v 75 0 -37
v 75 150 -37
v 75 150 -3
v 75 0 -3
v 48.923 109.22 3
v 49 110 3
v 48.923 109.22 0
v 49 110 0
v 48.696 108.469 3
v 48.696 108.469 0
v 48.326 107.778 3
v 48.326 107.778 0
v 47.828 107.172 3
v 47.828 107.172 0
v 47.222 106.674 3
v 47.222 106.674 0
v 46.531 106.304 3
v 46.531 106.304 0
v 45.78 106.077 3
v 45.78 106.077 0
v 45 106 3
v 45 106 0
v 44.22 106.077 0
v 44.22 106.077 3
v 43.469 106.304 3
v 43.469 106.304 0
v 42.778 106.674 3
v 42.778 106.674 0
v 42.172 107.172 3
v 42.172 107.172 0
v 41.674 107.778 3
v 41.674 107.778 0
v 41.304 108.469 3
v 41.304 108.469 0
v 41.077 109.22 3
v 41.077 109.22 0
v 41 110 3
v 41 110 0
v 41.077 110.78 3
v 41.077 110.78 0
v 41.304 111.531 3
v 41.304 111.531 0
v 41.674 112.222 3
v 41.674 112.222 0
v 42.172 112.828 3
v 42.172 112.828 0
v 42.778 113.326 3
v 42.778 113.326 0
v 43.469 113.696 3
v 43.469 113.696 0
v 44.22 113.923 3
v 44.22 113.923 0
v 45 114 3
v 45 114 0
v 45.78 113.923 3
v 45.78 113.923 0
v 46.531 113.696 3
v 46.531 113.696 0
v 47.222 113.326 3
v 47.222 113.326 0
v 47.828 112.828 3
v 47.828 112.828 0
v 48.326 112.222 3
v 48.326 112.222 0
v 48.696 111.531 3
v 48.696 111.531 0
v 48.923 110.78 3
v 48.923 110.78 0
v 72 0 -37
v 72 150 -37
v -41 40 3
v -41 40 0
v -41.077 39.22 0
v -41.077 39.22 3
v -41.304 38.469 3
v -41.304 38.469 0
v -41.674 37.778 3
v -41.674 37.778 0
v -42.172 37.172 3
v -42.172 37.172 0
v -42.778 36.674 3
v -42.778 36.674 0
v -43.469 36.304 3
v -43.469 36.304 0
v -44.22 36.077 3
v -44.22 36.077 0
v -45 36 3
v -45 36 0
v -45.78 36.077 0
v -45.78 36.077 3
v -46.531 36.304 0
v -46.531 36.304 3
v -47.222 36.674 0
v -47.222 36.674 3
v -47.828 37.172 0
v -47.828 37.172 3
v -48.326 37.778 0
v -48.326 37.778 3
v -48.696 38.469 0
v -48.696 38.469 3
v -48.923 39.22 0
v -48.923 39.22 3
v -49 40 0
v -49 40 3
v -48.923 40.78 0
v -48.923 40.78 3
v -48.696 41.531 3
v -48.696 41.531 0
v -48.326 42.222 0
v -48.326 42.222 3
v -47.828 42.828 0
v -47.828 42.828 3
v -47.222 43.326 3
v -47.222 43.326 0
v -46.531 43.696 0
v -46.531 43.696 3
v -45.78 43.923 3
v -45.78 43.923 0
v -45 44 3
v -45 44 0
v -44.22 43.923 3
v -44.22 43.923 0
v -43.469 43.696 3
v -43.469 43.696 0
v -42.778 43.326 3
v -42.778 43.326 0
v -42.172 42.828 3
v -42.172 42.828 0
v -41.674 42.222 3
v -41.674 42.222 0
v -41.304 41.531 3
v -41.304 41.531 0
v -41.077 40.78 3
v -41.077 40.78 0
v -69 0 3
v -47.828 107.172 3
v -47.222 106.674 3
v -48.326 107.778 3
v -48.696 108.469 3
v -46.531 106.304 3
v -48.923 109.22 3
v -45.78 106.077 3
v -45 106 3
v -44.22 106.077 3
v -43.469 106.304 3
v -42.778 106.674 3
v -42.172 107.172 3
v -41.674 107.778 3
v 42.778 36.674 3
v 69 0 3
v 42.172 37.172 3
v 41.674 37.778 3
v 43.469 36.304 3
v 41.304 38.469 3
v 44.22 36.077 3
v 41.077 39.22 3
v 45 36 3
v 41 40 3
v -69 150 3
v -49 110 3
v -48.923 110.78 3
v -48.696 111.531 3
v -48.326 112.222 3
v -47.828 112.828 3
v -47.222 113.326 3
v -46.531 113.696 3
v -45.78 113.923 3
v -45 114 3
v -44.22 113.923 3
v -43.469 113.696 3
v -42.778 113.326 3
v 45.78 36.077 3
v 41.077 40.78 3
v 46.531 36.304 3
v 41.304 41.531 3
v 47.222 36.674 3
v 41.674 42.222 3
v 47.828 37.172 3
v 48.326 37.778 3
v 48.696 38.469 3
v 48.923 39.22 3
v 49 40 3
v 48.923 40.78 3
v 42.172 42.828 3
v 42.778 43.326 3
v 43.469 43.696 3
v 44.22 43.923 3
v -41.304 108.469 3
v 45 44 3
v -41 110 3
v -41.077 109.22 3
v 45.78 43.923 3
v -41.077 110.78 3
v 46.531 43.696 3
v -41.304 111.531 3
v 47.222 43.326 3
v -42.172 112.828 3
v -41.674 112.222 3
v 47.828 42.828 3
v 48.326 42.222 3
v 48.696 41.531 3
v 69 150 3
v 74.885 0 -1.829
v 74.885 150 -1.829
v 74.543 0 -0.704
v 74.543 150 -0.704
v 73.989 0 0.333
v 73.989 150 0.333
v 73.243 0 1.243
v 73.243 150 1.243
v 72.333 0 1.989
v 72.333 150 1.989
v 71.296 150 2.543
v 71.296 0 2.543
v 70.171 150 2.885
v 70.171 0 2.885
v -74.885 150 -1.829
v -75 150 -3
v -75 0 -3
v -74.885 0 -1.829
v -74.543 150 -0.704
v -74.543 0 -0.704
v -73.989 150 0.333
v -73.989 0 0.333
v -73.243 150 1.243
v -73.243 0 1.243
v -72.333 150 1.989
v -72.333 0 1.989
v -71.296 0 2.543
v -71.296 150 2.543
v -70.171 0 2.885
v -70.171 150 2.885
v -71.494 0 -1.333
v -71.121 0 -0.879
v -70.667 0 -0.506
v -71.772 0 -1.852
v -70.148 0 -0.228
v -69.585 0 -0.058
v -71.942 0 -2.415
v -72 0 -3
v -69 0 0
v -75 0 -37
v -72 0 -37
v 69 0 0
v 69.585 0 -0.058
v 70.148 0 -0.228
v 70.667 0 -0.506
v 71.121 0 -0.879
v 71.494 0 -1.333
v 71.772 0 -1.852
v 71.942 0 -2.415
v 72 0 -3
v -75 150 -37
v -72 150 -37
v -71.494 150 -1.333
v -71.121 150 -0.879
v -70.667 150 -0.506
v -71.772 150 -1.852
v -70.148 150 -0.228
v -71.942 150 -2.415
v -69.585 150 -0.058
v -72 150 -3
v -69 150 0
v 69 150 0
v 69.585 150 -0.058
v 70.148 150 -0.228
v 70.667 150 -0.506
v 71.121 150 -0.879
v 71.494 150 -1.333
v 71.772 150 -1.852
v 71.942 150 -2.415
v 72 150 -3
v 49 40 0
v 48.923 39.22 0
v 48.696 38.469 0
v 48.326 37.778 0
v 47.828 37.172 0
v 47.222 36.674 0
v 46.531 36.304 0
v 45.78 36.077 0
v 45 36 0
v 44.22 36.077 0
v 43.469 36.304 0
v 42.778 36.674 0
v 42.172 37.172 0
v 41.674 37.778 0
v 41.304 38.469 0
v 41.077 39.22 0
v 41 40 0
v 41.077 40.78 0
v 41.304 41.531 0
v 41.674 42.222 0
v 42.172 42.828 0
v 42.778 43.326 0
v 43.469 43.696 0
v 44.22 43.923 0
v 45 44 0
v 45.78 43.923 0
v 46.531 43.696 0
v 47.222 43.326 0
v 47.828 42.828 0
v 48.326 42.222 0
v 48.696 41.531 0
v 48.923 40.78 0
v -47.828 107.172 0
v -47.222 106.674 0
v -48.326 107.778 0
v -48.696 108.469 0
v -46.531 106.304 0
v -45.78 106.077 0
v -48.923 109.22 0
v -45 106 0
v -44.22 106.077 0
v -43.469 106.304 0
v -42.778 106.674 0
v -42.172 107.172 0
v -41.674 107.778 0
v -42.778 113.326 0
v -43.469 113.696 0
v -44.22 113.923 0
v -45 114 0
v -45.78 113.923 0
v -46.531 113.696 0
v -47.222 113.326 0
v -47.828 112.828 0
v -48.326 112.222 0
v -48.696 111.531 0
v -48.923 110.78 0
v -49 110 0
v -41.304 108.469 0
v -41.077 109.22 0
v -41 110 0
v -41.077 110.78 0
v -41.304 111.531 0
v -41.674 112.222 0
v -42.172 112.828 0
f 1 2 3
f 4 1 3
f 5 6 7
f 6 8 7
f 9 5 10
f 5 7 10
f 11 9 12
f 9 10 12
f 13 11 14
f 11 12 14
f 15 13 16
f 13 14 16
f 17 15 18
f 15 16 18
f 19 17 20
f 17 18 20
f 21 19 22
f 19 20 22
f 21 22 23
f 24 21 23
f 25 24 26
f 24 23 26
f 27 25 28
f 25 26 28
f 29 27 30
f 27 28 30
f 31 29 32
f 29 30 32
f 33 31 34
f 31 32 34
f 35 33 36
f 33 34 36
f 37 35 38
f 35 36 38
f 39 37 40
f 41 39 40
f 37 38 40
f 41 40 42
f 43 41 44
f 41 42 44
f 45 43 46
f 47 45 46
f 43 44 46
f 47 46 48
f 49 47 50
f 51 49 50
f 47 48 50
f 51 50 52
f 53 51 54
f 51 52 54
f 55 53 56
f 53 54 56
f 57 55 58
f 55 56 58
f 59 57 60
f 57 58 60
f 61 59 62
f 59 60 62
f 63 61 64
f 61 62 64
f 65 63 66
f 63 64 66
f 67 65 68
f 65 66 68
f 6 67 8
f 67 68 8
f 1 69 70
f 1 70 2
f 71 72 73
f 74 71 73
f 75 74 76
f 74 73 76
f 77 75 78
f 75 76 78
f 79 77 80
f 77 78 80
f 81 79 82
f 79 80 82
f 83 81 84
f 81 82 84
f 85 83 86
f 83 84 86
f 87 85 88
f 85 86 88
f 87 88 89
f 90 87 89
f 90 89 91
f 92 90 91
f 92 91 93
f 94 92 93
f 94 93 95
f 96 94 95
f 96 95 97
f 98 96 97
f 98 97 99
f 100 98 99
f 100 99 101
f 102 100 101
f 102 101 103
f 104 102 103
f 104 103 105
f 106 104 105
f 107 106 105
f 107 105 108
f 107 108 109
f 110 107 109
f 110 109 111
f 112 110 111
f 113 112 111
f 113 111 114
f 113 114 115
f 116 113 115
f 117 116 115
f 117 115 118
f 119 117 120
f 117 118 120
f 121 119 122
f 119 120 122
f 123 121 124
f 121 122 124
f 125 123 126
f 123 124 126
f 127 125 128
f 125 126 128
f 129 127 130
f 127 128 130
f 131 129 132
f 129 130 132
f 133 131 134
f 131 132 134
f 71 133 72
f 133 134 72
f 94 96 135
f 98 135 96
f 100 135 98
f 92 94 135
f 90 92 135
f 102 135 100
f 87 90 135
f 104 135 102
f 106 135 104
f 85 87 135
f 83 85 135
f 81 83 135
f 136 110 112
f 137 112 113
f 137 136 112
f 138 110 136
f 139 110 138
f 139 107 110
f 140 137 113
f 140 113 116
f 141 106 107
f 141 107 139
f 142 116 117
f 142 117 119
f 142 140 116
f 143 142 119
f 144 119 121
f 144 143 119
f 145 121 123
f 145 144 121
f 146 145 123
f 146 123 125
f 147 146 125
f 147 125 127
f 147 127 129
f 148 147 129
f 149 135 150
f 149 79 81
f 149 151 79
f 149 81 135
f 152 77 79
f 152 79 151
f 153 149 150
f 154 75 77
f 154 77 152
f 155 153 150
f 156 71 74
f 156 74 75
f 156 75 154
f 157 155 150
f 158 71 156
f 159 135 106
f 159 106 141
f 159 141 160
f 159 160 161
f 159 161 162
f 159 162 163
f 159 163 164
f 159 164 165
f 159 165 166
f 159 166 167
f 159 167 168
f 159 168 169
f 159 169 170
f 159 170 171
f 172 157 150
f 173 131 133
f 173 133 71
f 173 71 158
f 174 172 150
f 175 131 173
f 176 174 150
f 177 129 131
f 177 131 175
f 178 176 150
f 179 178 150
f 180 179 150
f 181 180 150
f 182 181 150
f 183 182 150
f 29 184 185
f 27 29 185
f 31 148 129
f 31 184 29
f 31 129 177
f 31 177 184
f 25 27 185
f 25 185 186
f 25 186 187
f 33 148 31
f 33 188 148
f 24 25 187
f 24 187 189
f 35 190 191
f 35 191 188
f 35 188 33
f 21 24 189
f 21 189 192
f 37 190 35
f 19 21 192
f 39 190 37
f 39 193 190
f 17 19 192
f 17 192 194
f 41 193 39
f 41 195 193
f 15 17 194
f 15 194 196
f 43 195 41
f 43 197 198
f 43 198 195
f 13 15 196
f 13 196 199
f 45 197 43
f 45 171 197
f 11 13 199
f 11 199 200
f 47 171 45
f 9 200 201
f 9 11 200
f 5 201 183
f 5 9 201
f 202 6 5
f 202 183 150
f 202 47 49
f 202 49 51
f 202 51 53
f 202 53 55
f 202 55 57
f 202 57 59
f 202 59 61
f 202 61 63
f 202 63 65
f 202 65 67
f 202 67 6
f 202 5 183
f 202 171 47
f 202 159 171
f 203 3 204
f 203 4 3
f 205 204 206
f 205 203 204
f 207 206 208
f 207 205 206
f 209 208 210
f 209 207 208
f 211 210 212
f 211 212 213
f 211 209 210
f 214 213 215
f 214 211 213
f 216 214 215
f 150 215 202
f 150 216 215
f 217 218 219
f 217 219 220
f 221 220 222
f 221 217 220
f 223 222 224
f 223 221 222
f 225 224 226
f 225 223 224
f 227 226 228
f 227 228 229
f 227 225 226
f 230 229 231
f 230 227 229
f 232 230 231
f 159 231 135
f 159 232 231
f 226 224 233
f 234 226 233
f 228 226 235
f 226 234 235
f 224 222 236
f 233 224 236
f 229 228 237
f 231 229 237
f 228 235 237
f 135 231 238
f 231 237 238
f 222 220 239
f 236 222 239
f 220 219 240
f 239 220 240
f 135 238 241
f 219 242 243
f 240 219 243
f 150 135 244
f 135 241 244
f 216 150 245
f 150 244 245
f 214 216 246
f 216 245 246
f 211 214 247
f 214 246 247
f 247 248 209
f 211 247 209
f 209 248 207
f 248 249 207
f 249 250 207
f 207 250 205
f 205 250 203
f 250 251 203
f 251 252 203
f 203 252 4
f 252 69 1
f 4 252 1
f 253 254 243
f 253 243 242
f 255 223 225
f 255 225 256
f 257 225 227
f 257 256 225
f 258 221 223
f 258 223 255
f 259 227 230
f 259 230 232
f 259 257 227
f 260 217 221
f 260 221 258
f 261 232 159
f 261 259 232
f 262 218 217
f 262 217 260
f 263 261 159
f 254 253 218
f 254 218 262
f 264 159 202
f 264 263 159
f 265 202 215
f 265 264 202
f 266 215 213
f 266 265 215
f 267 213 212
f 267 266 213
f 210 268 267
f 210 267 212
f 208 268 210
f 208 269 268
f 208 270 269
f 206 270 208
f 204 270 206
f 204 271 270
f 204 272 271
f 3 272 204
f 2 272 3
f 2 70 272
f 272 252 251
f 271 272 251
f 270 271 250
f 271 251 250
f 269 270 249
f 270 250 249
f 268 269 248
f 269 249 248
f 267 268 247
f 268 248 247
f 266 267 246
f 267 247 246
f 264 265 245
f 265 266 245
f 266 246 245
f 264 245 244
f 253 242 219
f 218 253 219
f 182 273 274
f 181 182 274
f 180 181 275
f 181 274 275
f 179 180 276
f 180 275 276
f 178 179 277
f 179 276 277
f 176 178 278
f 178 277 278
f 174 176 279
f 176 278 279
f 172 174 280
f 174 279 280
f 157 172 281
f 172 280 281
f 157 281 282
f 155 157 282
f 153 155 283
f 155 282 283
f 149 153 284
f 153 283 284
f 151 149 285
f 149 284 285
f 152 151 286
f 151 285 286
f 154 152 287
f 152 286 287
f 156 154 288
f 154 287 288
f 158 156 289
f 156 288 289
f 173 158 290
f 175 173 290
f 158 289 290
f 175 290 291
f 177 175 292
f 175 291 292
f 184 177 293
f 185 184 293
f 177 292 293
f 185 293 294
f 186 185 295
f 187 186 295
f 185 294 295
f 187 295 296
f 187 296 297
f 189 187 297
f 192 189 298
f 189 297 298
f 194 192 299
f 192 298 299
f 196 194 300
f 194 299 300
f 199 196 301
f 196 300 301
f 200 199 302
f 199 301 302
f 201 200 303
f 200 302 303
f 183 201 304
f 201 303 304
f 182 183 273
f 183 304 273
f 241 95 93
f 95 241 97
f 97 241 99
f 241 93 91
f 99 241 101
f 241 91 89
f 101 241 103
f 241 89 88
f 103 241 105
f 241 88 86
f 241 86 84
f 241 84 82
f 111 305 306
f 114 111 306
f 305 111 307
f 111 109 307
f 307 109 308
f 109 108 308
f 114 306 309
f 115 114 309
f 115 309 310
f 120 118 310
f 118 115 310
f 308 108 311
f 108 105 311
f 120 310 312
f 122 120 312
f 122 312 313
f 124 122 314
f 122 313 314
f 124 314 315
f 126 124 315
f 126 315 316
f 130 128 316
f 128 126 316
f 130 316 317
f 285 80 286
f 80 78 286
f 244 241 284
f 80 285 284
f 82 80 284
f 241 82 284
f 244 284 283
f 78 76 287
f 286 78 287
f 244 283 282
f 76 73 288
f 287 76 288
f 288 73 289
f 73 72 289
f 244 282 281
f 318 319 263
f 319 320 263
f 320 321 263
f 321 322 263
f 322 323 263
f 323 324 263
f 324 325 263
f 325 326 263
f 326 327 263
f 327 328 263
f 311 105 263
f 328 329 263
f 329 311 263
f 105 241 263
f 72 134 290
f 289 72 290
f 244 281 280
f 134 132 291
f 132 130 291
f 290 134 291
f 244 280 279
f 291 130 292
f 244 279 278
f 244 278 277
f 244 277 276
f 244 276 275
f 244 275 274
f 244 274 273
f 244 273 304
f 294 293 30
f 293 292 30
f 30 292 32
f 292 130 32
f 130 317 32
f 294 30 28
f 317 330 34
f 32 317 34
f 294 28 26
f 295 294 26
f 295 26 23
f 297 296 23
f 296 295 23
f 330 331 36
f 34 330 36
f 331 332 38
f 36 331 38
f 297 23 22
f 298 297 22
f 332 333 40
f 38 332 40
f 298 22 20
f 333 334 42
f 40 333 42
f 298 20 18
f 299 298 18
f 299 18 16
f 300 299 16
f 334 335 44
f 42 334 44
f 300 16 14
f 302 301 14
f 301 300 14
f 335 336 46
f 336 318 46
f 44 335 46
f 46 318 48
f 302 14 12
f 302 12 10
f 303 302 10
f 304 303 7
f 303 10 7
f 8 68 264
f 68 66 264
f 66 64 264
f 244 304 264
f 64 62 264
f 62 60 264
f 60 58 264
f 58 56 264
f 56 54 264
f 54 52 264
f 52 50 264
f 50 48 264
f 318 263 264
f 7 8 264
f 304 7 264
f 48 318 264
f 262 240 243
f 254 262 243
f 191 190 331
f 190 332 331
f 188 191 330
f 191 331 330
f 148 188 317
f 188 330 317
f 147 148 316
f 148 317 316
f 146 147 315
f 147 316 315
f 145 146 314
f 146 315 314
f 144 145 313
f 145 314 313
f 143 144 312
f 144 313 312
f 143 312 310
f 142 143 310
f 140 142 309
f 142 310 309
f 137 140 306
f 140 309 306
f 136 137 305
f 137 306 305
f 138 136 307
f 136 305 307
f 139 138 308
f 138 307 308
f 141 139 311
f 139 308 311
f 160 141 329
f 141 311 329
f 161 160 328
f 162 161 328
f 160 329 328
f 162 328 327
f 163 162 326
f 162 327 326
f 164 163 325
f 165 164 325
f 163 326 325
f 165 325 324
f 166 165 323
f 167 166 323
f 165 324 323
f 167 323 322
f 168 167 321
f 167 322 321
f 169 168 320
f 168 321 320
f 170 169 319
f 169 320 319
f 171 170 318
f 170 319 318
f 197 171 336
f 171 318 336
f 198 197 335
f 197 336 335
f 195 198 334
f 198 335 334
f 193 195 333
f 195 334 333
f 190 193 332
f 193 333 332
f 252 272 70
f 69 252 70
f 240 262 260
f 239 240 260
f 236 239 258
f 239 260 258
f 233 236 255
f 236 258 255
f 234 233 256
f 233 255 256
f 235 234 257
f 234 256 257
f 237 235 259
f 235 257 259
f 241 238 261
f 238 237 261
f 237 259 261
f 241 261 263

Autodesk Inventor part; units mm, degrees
ref_plane "YZ Plane" through (0, 0, 0) normal (1, 0, 0) x (0, 1, 0)
ref_plane "XZ Plane" through (0, 0, 0) normal (0, 1, 0) x (-1, 0, 0)
ref_plane "XY Plane" through (0, 0, 0) normal (0, 0, 1) x (1, 0, 0)
sketch "Sketch1" plane through (0, 0, 0) normal (0, 0, 1) x (1, 0, 0)
  line L0 (75, 0) -> (-75, 0)
  line L1 (-75, 0) -> (-75, 150)
  line L2 (-75, 150) -> (75, 150)
  line L3 (75, 150) -> (75, 0)
  point P0 (0, 0)
  point P1 (0, 0)
  dimension "d1" = 150
  dimension "d2" = 150
extrude "Plate1" add sketch "Sketch1" along normal blind 3
sketch "Sketch2" plane through (0, 0, 0) normal (0, 0, 1) x (1, 0, 0)
  line L0 (-75, 0) -> (-75, 150) projected
  line L1 (75, 0) -> (-75, 0) projected
  line L2 (75, 150) -> (75, 0) projected
  line L3 (-75, 150) -> (75, 150) projected
  circle A0 centre (0, 75) radius 17.5
  line L4 (45, 40) -> (-45, 40) construction
  line L5 (-45, 40) -> (-45, 110) construction
  line L6 (-45, 110) -> (45, 110) construction
  line L7 (45, 110) -> (45, 40) construction
  line L8 (45, 40) -> (-45, 110) construction
  line L9 (-45, 40) -> (45, 110) construction
  circle A1 centre (-45, 40) radius 4
  circle A2 centre (45, 40) radius 4
  circle A3 centre (45, 110) radius 4
  circle A4 centre (-45, 110) radius 4
  point P0 (0, 0)
  point P1 (0, 0)
  point P2 (75, 75)
  dimension "d3" = 35
  dimension "d4" = 90
  dimension "d5" = 70
  dimension "d7" = 8
extrude "Extrusion1" cut sketch "Sketch2" along normal through all contours A1 | A2 | A3 | A4
sketch "Sketch3" plane through (-72, 150, 3) normal (-1, 0, 0) x (0, -1, 0)
  line L0 (150, 0) -> (0, 0)
  line L1 (0, 0) -> (0, -40)
  line L2 (0, -40) -> (150, -40)
  line L3 (150, -40) -> (150, 0)
edge flange "Flange1" height 40 angle 90 thickness 3 bend radius 3 thickness toward (-1, 0, 0) relief tear relief width 3 relief depth 1.5 corner gap 3 corner form 0 edges at (-75, 75, 0) (75, 75, 0) wall of the first edge with corners at (-72, 0, 3) (-72, 150, 3) (-72, 150, -37) (-72, 0, -37)
bend "Bend1"
corner "Corner1"
sketch "Sketch4" plane through (0, 0, 0) normal (0, 0, 1) x (1, 0, 0)
  circle A0 centre (0, 75) radius 17.5 projected
  line L0 (0, 125) -> (0, 105) construction
  line L1 (-3, 125) -> (-3, 105)
  line L2 (3, 105) -> (3, 125)
  arc A1 (3, 125) -> (-3, 125) centre (0, 125) ccw
  arc A2 (-3, 105) -> (3, 105) centre (0, 105) ccw
  arc A3 (34.641, 95) -> (20, 109.641) centre (0, 75) ccw construction
  arc A4 (37.2391, 96.5) -> (21.5, 112.2391) centre (0, 75) ccw
  arc A5 (32.0429, 93.5) -> (18.5, 107.0429) centre (0, 75) ccw
  arc A6 (32.0429, 93.5) -> (37.2391, 96.5) centre (34.641, 95) ccw
  arc A7 (21.5, 112.2391) -> (18.5, 107.0429) centre (20, 109.641) ccw
  line L3 (0, 75) -> (20, 109.641) construction
  line L4 (0, 75) -> (40, 75) construction
  line L5 (0, 75) -> (34.641, 95) construction
  point P0 (0, 0)
  point P1 (0, 115)
  dimension "d20" = 20
  dimension "d21" = 6
  dimension "d22" = 30
  dimension "d23" = 60
  dimension "d24" = 30
  dimension "d25" = 6
  dimension "d26" = 40
extrude "Extrusion2" [suppressed]
pattern_circular "Circular Pattern1" [suppressed]
equation "\"d1\" = d2"
equation "\"d0\" = Thickness"
equation "\"d10\" = BendReliefWidth"
equation "\"d11\" = BendReliefDepth"
equation "\"d12\" = MinimumRemnant"
equation "\"d13\" = TransitionRadius"
equation "\"d16\" = BendRadius"
equation "\"d17\" = CornerReliefSize"
equation "\"d18\" = GapSize"
equation "\"d19\" = JacobiRadiusSize"
equation "\"BendRadius\" = Thickness"
equation "\"BendReliefWidth\" = Thickness"
equation "\"BendReliefDepth\" = 0.5 * Thickness"
equation "\"CornerReliefSize\" = 4 * Thickness"
equation "\"MinimumRemnant\" = 2 * Thickness"
equation "\"TransitionRadius\" = BendRadius"
equation "\"JacobiRadiusSize\" = BendRadius"
equation "\"GapSize\" = Thickness"
equation "\"Thickness\" = 3"
properties part number "FL3.6.2  Motor pillar" material "Stainless Steel"
